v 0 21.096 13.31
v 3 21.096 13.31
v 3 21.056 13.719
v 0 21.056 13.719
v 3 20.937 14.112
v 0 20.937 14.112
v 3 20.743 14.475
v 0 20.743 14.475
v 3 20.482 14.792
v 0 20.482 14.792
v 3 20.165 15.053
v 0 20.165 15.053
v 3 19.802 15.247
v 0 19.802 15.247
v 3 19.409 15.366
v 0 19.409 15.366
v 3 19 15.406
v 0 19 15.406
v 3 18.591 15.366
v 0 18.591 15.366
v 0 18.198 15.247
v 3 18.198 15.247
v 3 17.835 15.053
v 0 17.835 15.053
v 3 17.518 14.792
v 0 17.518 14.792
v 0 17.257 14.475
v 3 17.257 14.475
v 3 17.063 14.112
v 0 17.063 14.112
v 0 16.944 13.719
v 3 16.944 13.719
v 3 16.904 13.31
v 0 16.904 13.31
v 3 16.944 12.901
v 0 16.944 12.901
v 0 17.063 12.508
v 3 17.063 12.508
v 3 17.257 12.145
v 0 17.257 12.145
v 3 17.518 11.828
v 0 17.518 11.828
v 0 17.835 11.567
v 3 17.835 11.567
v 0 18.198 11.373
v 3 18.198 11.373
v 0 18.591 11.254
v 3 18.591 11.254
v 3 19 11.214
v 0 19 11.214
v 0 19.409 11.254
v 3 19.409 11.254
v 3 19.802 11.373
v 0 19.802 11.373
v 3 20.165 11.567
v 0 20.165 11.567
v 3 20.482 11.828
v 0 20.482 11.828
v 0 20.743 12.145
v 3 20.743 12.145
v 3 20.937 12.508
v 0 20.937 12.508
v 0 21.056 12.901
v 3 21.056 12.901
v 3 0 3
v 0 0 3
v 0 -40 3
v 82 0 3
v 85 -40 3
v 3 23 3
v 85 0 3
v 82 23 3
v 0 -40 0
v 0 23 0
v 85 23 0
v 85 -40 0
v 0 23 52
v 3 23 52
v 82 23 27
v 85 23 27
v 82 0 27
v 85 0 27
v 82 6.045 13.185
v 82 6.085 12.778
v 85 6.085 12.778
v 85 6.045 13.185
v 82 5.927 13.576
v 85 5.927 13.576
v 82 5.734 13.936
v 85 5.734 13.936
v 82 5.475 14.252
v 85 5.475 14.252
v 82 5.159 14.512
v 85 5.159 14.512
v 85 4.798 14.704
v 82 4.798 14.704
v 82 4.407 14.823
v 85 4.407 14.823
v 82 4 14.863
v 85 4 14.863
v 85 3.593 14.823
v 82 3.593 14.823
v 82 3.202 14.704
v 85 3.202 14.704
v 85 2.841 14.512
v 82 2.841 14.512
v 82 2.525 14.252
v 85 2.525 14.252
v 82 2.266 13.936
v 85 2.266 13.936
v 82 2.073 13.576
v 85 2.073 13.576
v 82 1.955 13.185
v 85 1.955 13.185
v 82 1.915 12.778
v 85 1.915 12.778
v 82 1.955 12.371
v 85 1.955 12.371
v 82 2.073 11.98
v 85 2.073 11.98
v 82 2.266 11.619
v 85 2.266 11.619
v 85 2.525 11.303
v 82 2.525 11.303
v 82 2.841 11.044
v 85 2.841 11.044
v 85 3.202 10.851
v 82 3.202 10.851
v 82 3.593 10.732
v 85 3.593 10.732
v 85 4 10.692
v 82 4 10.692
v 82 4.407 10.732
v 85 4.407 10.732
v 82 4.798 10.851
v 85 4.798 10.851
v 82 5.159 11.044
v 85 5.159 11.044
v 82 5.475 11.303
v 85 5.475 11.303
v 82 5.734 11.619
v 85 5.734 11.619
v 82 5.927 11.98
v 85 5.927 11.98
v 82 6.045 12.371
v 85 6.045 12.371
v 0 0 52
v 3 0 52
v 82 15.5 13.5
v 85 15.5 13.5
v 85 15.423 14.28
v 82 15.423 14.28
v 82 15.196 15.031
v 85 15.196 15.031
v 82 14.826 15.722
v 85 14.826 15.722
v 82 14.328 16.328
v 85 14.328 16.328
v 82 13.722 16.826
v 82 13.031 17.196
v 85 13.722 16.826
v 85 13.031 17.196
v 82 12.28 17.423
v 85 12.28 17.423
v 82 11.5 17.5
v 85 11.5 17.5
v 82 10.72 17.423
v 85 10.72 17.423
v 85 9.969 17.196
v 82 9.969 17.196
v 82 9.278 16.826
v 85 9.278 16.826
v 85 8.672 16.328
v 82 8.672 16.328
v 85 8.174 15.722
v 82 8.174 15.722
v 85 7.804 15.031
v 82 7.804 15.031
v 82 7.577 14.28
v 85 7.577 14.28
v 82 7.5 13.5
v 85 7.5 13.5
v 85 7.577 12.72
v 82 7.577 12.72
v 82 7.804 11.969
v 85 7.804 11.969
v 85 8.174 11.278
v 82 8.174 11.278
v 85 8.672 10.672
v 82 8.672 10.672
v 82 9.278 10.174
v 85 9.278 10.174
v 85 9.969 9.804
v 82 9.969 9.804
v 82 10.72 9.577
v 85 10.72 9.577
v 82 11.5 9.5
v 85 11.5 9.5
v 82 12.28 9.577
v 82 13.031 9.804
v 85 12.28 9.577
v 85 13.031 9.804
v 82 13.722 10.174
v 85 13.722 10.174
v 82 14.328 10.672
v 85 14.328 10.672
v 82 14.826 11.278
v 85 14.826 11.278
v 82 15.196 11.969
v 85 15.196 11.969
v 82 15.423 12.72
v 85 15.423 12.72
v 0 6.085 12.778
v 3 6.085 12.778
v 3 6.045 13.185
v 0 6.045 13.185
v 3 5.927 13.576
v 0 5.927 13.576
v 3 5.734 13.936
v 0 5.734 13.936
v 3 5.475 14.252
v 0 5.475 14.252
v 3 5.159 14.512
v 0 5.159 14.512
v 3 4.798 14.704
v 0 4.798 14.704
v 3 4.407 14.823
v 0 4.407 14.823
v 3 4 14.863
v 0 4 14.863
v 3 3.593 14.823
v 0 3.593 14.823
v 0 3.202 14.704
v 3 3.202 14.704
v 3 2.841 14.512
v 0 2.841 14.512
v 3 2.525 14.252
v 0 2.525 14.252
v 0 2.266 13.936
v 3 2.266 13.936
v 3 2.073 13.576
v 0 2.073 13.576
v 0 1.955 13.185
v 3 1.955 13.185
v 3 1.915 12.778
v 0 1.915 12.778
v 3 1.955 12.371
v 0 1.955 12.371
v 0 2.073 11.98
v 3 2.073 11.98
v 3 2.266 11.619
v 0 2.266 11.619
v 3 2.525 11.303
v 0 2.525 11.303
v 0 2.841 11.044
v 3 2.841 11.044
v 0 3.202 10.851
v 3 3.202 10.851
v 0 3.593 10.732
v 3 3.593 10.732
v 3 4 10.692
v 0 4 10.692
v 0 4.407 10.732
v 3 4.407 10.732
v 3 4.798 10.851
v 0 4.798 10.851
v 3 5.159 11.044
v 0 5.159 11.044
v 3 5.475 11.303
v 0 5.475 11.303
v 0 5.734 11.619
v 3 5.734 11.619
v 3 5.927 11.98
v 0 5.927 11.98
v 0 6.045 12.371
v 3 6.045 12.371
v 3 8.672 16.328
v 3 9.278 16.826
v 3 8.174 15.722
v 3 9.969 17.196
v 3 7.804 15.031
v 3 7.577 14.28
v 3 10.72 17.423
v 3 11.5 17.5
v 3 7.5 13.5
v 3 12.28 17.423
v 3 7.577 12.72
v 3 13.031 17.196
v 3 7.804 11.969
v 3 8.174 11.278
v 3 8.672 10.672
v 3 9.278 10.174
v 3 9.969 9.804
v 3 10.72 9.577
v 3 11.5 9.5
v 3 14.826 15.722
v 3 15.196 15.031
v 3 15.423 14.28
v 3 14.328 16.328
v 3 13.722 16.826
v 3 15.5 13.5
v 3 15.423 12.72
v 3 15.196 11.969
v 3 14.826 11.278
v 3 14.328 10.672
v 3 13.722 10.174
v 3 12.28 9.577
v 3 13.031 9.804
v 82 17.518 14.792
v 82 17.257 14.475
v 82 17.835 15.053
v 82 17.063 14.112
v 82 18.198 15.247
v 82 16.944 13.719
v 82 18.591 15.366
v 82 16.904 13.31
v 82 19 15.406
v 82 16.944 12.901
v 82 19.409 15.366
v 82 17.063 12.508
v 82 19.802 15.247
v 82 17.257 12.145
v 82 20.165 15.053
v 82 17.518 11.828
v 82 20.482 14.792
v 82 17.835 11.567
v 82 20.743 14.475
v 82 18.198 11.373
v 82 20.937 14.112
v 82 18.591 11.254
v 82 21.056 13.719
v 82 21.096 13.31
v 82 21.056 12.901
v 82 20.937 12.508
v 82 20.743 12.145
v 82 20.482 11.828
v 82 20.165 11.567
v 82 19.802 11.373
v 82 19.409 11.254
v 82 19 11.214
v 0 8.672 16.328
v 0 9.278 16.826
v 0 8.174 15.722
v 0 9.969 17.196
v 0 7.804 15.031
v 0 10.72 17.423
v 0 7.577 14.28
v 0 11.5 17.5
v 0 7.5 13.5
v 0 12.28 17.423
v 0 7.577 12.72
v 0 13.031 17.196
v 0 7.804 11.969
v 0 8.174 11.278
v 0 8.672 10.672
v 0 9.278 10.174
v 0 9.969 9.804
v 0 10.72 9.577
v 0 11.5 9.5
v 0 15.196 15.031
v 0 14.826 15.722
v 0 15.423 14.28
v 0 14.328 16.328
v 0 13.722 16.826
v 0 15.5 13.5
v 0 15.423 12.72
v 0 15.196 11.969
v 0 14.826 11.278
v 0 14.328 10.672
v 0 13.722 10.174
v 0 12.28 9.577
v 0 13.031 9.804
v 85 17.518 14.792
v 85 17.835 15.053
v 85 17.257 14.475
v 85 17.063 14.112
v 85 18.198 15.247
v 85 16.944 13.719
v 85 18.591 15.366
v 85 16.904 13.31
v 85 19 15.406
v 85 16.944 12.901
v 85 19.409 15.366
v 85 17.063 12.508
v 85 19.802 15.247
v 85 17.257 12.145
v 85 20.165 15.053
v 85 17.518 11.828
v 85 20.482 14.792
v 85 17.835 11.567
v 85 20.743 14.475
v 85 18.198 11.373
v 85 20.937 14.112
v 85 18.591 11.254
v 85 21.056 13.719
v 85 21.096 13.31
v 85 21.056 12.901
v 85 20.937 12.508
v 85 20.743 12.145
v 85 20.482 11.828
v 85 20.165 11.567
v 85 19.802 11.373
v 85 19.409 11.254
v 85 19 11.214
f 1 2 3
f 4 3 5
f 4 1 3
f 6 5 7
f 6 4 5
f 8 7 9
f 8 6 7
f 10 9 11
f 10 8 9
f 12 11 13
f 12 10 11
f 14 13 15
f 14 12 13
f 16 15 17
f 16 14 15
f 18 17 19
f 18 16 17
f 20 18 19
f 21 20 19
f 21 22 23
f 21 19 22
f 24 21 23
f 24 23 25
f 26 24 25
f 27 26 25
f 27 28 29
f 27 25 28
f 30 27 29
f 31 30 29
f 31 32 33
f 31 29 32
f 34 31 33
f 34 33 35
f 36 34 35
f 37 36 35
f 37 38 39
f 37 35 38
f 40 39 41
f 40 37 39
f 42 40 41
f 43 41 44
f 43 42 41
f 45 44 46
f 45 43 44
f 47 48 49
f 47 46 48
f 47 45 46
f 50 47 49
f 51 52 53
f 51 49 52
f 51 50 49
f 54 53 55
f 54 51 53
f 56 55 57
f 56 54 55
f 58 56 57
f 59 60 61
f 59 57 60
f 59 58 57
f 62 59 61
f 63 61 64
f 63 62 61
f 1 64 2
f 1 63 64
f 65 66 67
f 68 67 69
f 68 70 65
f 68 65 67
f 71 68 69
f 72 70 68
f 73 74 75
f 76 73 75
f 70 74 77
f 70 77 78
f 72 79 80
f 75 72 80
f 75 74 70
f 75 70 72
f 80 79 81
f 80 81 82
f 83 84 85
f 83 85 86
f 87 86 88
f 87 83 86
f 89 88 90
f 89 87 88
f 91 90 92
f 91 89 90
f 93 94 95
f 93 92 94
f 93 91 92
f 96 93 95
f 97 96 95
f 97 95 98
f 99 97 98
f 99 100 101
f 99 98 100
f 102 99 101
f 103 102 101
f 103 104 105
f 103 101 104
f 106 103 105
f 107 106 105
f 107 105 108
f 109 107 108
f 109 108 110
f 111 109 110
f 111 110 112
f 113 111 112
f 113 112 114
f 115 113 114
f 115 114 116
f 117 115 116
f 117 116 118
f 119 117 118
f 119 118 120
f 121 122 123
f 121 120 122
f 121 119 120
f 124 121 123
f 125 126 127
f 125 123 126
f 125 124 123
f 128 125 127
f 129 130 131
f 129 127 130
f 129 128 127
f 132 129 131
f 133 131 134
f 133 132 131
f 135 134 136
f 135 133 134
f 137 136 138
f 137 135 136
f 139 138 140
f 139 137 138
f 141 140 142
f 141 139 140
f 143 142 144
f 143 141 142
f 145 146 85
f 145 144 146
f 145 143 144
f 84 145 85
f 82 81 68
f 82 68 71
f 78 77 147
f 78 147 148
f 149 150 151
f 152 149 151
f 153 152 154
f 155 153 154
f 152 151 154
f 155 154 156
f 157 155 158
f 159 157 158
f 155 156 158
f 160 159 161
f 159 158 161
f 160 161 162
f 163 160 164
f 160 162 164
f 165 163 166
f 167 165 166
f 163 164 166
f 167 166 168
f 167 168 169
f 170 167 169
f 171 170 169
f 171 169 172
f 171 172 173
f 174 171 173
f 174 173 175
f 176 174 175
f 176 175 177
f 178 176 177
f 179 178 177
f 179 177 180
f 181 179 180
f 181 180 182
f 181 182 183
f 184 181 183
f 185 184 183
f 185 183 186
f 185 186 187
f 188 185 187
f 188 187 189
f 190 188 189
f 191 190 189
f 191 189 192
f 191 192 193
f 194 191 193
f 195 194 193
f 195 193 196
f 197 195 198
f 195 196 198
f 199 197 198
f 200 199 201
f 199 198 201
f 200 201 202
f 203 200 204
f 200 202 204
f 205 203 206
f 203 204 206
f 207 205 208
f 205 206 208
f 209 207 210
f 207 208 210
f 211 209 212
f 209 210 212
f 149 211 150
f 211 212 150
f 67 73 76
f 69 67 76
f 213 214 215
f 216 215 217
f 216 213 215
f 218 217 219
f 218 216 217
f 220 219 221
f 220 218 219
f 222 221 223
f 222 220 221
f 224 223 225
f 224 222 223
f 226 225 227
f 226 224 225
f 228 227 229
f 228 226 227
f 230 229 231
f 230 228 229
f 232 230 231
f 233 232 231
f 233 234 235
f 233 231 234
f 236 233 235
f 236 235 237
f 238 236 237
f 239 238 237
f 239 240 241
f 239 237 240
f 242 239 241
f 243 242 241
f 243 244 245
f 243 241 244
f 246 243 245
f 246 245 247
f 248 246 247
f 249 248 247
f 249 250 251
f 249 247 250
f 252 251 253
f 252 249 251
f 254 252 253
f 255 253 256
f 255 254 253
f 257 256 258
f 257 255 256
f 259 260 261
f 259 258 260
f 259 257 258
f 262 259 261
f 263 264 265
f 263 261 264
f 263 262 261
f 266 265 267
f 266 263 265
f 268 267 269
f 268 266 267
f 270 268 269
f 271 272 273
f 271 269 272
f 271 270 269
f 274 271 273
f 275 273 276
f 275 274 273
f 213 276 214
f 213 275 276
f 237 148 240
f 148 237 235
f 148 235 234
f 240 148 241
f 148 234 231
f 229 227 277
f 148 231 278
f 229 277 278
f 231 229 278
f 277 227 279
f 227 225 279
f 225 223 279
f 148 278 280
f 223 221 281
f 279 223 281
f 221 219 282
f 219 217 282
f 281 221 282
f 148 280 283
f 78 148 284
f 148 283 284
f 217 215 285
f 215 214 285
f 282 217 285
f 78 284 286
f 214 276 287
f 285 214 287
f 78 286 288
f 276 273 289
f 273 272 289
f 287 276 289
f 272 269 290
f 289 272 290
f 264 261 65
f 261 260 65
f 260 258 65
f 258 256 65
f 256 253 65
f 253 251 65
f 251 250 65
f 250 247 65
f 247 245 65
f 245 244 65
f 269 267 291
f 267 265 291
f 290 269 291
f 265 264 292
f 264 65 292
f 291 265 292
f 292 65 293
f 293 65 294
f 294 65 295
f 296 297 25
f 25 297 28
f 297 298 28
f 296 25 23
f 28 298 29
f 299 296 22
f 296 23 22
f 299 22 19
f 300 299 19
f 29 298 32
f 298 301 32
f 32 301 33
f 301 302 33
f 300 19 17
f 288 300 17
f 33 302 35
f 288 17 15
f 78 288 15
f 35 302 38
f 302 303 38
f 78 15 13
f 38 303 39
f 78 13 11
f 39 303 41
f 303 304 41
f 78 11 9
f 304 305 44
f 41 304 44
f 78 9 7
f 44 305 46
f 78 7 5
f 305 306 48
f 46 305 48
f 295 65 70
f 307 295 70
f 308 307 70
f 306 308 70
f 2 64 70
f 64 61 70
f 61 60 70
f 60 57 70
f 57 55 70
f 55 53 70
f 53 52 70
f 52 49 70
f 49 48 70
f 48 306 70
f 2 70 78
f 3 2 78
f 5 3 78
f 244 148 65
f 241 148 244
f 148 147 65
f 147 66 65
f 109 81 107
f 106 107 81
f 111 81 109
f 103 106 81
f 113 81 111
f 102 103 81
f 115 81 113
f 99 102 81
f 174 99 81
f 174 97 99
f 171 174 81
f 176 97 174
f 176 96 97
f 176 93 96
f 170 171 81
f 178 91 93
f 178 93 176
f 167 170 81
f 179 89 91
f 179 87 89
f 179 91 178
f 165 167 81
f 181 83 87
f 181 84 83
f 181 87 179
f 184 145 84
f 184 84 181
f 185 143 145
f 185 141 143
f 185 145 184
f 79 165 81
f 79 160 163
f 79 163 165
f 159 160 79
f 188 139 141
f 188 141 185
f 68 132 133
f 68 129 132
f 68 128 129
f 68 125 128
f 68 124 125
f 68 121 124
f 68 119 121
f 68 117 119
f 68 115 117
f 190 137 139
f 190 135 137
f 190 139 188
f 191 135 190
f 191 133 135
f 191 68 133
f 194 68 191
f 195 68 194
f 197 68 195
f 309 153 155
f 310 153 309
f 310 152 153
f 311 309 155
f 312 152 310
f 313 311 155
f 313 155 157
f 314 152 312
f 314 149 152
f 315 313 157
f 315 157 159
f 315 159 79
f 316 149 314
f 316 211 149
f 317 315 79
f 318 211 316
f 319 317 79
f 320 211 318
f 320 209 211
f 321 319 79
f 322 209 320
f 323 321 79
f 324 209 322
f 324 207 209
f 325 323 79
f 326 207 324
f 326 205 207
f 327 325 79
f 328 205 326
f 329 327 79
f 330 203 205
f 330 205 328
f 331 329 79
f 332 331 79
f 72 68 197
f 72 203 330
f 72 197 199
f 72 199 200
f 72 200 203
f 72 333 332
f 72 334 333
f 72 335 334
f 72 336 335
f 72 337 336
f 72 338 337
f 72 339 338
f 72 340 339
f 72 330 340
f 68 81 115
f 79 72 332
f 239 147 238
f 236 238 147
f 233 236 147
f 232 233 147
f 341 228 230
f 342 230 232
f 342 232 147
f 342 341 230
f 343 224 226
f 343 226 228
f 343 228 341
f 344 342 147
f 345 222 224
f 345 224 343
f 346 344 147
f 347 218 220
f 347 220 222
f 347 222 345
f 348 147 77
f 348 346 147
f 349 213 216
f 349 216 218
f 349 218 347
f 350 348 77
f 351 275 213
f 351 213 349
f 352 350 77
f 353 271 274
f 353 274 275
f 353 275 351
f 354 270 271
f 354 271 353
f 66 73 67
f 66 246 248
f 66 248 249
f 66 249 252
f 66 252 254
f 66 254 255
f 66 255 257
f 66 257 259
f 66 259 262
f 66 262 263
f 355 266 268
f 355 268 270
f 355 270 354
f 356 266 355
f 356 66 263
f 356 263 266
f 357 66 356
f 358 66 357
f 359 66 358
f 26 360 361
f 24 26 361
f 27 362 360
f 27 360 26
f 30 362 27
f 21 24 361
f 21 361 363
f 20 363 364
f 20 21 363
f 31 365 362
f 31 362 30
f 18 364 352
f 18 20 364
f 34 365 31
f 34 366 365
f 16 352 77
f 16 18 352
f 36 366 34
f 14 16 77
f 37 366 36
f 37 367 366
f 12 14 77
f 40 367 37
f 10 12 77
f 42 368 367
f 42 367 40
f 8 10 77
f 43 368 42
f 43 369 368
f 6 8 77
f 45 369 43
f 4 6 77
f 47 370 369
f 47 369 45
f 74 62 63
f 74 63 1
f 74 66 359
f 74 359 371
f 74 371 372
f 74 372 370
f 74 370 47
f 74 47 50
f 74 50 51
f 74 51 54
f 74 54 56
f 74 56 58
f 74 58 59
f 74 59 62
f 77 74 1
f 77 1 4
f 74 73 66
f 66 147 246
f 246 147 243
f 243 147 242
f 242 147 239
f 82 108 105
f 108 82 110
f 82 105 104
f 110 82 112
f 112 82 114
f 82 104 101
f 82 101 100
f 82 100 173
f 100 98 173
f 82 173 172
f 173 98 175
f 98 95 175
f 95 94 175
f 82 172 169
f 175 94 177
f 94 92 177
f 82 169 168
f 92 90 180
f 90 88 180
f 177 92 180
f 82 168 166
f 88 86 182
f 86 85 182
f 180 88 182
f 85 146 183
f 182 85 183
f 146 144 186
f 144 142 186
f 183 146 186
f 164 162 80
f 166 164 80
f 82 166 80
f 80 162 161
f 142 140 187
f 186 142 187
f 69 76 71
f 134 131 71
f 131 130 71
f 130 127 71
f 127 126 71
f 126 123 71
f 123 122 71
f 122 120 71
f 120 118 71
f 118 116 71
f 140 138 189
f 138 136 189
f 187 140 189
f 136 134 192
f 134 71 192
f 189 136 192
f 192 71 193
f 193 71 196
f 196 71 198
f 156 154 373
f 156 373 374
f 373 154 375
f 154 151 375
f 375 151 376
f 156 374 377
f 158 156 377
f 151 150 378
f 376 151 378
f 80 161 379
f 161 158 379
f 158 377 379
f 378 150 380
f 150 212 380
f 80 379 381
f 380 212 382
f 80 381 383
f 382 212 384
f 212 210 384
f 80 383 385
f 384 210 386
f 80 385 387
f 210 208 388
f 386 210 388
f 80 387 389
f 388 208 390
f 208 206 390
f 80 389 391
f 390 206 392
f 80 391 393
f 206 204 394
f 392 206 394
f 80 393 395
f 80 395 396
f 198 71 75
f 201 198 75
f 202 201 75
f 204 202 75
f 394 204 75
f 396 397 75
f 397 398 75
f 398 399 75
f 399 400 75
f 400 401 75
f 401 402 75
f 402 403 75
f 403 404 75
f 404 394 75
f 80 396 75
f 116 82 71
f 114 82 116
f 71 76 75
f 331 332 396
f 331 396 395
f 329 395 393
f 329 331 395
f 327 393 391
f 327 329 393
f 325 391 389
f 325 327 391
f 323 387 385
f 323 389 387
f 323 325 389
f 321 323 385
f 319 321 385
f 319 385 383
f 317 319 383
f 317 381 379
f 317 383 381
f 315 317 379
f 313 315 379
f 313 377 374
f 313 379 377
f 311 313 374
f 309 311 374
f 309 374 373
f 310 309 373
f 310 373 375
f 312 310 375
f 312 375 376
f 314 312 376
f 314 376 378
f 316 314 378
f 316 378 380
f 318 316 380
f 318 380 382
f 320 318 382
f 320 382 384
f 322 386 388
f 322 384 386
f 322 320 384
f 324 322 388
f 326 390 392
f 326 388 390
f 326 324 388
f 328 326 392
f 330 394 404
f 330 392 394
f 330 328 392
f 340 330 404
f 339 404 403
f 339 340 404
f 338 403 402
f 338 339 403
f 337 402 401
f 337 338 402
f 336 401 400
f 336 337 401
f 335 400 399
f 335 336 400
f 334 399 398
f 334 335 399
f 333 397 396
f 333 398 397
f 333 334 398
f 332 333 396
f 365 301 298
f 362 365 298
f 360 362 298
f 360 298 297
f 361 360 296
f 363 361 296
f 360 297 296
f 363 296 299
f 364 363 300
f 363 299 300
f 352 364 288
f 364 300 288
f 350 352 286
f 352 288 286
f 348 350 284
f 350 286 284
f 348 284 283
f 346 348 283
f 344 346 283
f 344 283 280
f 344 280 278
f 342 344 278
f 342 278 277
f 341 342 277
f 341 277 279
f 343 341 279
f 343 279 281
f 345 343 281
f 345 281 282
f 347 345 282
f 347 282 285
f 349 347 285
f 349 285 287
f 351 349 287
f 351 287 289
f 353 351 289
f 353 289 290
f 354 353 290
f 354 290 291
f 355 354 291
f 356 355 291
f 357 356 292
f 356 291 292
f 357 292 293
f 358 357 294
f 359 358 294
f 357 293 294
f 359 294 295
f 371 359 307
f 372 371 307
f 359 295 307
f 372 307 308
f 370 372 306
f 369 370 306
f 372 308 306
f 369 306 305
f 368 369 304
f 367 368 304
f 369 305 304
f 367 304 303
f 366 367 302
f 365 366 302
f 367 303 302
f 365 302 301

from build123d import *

# Parameters (mm, degrees)
F0_W      = 85
F0_H      = 23
F0_H_2    = 40
F1_DEPTH  = 3
F2_W      = 3
F2_H      = 23
F3_DEPTH  = 24
F4_W      = 3
F4_H      = 23
F5_DEPTH  = 25
F6_R      = 4
F7_DEPTH  = 200
F8_R      = 2.096138
F9_DEPTH  = 101.9
F10_R     = 2.08537
F11_DEPTH = 136.8


with BuildPart() as f1:
    # F0 (on Top) → F1 (new body)
    with BuildSketch(Plane.XY):
        with Locations((42.5, 11.5)):
            Rectangle(F0_W, F0_H)
        with Locations((42.5, -20)):
            Rectangle(F0_W, F0_H_2)
    extrude(amount=F1_DEPTH)

    # F2 (on face) → F3 (join)
    with BuildSketch(Plane.XY.offset(3)):
        with Locations((1.5, 11.5)):
            Rectangle(F2_W, F2_H)
        with Locations((83.5, 11.5)):
            Rectangle(F2_W, F2_H)
    extrude(amount=F3_DEPTH)

    # F4 (on face) → F5 (join)
    with BuildSketch(Plane.XY.offset(27)):
        with Locations((1.5, 11.5)):
            Rectangle(F4_W, F4_H)
    extrude(amount=F5_DEPTH)

    # F6 (on face) → F7 (cut)
    with BuildSketch(Plane.YZ.offset(85)):
        with Locations((11.5, 13.5)):
            Circle(F6_R)
    extrude(amount=-F7_DEPTH, mode=Mode.SUBTRACT)

    # F8 (on Right) → F9 (cut)
    with BuildSketch(Plane.YZ):
        with Locations((19.000002, 13.309989)):
            Circle(F8_R)
    extrude(amount=F9_DEPTH, mode=Mode.SUBTRACT)

    # F10 (on Right) → F11 (cut)
    with BuildSketch(Plane.YZ):
        with Locations((4, 12.777778)):
            Circle(F10_R)
    extrude(amount=F11_DEPTH, mode=Mode.SUBTRACT)


solid = f1.part
